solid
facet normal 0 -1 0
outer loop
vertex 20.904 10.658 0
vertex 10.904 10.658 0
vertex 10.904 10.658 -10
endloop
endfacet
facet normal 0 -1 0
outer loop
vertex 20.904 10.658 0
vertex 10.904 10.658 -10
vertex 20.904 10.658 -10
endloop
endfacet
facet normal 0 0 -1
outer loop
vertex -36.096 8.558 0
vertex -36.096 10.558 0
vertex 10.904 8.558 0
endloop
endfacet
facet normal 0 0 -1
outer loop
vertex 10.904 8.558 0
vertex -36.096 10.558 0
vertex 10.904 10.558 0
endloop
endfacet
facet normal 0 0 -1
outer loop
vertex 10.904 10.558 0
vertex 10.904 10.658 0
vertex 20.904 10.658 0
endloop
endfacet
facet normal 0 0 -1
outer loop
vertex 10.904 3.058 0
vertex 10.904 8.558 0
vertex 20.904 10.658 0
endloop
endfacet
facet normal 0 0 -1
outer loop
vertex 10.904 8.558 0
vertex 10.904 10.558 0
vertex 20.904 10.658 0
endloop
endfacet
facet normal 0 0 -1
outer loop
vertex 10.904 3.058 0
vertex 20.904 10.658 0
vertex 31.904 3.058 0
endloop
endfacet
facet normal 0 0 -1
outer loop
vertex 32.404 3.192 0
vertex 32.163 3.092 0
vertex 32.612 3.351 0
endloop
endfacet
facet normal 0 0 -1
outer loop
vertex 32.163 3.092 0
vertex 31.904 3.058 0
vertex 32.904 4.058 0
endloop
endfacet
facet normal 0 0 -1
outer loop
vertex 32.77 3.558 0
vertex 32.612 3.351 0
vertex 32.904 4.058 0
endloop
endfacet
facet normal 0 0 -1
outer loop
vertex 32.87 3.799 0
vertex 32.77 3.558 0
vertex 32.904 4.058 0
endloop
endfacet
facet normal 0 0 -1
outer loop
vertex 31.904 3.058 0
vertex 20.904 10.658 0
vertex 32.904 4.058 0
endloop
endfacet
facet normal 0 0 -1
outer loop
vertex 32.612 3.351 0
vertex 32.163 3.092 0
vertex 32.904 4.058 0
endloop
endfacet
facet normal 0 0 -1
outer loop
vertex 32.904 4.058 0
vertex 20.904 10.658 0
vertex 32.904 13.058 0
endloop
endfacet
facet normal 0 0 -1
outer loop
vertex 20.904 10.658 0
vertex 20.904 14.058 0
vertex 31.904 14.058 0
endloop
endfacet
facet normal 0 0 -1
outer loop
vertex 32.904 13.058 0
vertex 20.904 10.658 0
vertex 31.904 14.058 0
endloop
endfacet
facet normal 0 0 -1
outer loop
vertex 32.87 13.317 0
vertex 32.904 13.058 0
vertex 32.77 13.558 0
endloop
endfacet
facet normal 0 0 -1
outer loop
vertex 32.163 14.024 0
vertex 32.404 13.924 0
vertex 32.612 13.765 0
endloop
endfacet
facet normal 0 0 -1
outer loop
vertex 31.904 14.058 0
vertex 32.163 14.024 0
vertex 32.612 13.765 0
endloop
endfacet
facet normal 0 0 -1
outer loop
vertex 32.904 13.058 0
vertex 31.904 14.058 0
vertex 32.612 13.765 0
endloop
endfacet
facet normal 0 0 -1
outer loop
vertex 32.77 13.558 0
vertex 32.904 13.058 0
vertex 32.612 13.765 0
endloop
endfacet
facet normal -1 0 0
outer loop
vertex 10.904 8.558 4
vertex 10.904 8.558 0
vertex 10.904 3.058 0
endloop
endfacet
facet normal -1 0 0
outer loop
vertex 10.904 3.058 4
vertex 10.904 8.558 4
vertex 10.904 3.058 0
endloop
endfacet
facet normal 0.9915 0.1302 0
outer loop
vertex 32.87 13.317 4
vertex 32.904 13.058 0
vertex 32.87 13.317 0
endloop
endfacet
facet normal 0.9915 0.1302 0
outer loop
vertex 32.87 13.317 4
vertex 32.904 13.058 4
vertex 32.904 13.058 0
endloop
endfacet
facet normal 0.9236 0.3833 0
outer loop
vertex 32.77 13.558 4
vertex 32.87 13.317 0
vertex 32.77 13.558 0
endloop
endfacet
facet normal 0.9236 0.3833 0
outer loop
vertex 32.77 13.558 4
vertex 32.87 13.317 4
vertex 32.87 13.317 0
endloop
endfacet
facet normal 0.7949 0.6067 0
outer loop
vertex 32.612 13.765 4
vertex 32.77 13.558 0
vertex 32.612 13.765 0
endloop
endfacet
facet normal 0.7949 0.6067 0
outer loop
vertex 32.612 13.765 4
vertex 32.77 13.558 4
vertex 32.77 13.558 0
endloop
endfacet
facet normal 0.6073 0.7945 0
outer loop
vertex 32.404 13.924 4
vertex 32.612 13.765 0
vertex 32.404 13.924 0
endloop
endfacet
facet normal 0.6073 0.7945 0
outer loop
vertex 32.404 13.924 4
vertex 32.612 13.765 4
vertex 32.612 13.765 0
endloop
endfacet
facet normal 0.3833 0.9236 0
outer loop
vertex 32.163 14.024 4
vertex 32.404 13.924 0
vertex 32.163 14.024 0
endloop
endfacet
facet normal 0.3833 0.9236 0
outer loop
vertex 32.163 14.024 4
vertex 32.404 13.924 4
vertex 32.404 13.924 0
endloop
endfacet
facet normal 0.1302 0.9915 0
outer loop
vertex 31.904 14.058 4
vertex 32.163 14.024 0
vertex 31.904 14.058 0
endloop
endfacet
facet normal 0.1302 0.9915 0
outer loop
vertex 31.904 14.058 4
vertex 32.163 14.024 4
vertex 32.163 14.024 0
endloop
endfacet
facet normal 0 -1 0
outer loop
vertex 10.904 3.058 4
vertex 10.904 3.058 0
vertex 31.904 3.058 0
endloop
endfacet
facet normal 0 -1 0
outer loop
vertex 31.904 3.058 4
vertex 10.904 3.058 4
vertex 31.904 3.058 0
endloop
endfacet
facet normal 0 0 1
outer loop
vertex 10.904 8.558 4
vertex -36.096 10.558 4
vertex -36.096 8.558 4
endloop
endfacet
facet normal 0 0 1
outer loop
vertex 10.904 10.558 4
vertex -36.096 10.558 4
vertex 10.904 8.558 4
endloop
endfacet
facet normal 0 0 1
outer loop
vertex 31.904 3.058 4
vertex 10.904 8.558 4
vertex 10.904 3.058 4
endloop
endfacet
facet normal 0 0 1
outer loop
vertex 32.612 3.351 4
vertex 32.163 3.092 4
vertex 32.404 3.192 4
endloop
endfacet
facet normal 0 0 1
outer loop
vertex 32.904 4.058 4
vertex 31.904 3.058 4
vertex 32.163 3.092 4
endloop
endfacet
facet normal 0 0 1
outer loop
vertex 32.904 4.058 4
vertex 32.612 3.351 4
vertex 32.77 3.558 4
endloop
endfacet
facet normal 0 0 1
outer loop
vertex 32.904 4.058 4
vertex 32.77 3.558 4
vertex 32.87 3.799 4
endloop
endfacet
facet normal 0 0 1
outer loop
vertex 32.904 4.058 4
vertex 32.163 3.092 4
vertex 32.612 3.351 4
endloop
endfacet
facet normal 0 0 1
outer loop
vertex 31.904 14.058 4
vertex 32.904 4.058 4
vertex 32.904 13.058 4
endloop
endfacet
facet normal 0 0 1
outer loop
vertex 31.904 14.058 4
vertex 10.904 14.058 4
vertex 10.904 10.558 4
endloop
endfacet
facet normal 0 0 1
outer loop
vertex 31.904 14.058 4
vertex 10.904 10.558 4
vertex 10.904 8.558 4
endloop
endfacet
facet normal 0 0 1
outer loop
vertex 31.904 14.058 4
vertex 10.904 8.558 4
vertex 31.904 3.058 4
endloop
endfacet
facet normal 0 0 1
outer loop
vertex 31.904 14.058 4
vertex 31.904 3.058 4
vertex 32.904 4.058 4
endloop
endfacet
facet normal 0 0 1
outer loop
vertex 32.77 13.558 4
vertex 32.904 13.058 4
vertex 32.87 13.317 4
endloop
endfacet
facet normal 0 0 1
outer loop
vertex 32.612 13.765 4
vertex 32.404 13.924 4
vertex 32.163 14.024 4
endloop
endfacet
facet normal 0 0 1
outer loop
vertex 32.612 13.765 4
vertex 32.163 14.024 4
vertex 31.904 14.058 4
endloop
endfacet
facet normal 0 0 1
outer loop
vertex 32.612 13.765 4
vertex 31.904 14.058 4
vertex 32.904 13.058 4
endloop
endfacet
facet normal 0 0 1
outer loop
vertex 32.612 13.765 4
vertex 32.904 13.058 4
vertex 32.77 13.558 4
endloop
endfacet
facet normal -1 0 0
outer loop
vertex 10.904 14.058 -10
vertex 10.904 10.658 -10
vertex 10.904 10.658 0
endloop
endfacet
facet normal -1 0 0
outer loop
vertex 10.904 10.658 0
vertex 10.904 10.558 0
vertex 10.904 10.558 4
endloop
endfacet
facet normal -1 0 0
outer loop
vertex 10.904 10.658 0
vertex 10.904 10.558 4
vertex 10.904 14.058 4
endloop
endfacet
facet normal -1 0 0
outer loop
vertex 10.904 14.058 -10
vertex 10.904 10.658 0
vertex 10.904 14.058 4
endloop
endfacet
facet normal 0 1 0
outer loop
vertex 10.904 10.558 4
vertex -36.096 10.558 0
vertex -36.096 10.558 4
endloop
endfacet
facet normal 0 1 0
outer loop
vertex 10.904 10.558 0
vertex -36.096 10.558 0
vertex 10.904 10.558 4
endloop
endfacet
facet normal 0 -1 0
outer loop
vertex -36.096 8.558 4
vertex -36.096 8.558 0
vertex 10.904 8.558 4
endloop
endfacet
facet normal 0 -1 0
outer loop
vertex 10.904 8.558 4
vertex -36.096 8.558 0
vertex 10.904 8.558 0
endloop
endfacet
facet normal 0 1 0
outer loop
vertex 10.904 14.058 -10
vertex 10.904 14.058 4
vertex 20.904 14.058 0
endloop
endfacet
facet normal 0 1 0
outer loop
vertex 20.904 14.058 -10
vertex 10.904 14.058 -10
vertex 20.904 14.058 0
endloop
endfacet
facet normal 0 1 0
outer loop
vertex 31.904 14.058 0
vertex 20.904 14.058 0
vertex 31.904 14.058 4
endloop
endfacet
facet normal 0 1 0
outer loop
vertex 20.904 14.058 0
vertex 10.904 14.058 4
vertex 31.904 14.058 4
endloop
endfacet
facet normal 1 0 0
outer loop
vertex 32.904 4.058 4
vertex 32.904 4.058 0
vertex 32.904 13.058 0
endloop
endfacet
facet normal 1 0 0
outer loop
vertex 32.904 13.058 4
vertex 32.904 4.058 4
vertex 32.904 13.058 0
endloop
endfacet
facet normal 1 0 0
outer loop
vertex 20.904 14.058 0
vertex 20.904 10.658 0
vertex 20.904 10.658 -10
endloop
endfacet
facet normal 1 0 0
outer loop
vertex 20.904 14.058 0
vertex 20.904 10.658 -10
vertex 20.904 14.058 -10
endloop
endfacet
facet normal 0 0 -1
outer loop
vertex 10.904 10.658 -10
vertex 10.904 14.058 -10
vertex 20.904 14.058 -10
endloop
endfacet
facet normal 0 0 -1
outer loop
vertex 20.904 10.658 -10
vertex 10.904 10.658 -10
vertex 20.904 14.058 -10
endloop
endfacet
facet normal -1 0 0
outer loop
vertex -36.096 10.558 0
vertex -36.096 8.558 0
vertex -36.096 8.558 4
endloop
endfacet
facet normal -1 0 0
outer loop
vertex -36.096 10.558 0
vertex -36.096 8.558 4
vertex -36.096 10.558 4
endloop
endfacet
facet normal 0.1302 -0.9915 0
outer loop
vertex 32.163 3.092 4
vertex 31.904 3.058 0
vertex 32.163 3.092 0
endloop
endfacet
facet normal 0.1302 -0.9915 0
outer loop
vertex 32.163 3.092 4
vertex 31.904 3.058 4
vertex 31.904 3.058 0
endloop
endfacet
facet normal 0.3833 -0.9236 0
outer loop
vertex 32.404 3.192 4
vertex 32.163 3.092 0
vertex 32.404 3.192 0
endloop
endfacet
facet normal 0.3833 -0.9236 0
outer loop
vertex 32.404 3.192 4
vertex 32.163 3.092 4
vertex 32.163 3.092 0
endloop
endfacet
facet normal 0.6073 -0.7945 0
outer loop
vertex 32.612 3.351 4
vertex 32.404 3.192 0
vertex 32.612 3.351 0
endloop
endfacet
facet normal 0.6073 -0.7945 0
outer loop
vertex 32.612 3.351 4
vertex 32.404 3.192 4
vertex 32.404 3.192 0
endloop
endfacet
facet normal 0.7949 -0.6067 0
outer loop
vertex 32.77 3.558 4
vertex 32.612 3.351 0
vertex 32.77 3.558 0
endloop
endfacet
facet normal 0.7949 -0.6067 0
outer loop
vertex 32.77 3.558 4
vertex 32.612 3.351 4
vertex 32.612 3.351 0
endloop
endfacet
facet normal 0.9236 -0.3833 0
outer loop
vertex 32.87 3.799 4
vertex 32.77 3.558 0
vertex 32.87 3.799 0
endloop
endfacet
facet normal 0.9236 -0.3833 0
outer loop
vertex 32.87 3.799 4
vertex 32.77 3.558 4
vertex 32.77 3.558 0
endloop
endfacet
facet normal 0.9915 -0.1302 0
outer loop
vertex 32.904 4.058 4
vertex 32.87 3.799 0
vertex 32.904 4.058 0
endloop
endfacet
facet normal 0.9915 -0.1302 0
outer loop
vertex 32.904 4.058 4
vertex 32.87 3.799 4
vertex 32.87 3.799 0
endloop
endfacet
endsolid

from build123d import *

# Parameters (mm, degrees)
F0_W     = 47
F0_H     = 2
F0_W_2   = 10
F0_H_2   = 3.4
F1_DEPTH = 4
F2_DEPTH = 10
F3_R     = 1


with BuildPart() as f1:
    # F0 (on Top) → F1 (new body)
    with BuildSketch(Plane.XY):
        with Locations((-12.59553, 9.557682)):
            Rectangle(F0_W, F0_H)
        Polygon((10.90447, 10.657682), (10.90447, 10.557682), (10.90447, 8.557682), (10.90447, 3.057682), (32.90447, 3.057682), (32.90447, 14.057682), (20.90447, 14.057682), (20.90447, 10.657682), align=None)
        with Locations((15.90447, 12.357682)):
            Rectangle(F0_W_2, F0_H_2)
    extrude(amount=F1_DEPTH)

    # F0 (on Top) → F2 (join)
    with BuildSketch(Plane.XY):
        with Locations((15.90447, 12.357682)):
            Rectangle(F0_W_2, F0_H_2)
    extrude(amount=-F2_DEPTH)

    # F3
    f3_edges = [f1.edges().sort_by_distance(p)[0] for p in [
        (32.90447, 3.057682, 2),
        (32.90447, 14.057682, 2),
    ]]
    fillet(f3_edges, radius=F3_R)


solid = f1.part
